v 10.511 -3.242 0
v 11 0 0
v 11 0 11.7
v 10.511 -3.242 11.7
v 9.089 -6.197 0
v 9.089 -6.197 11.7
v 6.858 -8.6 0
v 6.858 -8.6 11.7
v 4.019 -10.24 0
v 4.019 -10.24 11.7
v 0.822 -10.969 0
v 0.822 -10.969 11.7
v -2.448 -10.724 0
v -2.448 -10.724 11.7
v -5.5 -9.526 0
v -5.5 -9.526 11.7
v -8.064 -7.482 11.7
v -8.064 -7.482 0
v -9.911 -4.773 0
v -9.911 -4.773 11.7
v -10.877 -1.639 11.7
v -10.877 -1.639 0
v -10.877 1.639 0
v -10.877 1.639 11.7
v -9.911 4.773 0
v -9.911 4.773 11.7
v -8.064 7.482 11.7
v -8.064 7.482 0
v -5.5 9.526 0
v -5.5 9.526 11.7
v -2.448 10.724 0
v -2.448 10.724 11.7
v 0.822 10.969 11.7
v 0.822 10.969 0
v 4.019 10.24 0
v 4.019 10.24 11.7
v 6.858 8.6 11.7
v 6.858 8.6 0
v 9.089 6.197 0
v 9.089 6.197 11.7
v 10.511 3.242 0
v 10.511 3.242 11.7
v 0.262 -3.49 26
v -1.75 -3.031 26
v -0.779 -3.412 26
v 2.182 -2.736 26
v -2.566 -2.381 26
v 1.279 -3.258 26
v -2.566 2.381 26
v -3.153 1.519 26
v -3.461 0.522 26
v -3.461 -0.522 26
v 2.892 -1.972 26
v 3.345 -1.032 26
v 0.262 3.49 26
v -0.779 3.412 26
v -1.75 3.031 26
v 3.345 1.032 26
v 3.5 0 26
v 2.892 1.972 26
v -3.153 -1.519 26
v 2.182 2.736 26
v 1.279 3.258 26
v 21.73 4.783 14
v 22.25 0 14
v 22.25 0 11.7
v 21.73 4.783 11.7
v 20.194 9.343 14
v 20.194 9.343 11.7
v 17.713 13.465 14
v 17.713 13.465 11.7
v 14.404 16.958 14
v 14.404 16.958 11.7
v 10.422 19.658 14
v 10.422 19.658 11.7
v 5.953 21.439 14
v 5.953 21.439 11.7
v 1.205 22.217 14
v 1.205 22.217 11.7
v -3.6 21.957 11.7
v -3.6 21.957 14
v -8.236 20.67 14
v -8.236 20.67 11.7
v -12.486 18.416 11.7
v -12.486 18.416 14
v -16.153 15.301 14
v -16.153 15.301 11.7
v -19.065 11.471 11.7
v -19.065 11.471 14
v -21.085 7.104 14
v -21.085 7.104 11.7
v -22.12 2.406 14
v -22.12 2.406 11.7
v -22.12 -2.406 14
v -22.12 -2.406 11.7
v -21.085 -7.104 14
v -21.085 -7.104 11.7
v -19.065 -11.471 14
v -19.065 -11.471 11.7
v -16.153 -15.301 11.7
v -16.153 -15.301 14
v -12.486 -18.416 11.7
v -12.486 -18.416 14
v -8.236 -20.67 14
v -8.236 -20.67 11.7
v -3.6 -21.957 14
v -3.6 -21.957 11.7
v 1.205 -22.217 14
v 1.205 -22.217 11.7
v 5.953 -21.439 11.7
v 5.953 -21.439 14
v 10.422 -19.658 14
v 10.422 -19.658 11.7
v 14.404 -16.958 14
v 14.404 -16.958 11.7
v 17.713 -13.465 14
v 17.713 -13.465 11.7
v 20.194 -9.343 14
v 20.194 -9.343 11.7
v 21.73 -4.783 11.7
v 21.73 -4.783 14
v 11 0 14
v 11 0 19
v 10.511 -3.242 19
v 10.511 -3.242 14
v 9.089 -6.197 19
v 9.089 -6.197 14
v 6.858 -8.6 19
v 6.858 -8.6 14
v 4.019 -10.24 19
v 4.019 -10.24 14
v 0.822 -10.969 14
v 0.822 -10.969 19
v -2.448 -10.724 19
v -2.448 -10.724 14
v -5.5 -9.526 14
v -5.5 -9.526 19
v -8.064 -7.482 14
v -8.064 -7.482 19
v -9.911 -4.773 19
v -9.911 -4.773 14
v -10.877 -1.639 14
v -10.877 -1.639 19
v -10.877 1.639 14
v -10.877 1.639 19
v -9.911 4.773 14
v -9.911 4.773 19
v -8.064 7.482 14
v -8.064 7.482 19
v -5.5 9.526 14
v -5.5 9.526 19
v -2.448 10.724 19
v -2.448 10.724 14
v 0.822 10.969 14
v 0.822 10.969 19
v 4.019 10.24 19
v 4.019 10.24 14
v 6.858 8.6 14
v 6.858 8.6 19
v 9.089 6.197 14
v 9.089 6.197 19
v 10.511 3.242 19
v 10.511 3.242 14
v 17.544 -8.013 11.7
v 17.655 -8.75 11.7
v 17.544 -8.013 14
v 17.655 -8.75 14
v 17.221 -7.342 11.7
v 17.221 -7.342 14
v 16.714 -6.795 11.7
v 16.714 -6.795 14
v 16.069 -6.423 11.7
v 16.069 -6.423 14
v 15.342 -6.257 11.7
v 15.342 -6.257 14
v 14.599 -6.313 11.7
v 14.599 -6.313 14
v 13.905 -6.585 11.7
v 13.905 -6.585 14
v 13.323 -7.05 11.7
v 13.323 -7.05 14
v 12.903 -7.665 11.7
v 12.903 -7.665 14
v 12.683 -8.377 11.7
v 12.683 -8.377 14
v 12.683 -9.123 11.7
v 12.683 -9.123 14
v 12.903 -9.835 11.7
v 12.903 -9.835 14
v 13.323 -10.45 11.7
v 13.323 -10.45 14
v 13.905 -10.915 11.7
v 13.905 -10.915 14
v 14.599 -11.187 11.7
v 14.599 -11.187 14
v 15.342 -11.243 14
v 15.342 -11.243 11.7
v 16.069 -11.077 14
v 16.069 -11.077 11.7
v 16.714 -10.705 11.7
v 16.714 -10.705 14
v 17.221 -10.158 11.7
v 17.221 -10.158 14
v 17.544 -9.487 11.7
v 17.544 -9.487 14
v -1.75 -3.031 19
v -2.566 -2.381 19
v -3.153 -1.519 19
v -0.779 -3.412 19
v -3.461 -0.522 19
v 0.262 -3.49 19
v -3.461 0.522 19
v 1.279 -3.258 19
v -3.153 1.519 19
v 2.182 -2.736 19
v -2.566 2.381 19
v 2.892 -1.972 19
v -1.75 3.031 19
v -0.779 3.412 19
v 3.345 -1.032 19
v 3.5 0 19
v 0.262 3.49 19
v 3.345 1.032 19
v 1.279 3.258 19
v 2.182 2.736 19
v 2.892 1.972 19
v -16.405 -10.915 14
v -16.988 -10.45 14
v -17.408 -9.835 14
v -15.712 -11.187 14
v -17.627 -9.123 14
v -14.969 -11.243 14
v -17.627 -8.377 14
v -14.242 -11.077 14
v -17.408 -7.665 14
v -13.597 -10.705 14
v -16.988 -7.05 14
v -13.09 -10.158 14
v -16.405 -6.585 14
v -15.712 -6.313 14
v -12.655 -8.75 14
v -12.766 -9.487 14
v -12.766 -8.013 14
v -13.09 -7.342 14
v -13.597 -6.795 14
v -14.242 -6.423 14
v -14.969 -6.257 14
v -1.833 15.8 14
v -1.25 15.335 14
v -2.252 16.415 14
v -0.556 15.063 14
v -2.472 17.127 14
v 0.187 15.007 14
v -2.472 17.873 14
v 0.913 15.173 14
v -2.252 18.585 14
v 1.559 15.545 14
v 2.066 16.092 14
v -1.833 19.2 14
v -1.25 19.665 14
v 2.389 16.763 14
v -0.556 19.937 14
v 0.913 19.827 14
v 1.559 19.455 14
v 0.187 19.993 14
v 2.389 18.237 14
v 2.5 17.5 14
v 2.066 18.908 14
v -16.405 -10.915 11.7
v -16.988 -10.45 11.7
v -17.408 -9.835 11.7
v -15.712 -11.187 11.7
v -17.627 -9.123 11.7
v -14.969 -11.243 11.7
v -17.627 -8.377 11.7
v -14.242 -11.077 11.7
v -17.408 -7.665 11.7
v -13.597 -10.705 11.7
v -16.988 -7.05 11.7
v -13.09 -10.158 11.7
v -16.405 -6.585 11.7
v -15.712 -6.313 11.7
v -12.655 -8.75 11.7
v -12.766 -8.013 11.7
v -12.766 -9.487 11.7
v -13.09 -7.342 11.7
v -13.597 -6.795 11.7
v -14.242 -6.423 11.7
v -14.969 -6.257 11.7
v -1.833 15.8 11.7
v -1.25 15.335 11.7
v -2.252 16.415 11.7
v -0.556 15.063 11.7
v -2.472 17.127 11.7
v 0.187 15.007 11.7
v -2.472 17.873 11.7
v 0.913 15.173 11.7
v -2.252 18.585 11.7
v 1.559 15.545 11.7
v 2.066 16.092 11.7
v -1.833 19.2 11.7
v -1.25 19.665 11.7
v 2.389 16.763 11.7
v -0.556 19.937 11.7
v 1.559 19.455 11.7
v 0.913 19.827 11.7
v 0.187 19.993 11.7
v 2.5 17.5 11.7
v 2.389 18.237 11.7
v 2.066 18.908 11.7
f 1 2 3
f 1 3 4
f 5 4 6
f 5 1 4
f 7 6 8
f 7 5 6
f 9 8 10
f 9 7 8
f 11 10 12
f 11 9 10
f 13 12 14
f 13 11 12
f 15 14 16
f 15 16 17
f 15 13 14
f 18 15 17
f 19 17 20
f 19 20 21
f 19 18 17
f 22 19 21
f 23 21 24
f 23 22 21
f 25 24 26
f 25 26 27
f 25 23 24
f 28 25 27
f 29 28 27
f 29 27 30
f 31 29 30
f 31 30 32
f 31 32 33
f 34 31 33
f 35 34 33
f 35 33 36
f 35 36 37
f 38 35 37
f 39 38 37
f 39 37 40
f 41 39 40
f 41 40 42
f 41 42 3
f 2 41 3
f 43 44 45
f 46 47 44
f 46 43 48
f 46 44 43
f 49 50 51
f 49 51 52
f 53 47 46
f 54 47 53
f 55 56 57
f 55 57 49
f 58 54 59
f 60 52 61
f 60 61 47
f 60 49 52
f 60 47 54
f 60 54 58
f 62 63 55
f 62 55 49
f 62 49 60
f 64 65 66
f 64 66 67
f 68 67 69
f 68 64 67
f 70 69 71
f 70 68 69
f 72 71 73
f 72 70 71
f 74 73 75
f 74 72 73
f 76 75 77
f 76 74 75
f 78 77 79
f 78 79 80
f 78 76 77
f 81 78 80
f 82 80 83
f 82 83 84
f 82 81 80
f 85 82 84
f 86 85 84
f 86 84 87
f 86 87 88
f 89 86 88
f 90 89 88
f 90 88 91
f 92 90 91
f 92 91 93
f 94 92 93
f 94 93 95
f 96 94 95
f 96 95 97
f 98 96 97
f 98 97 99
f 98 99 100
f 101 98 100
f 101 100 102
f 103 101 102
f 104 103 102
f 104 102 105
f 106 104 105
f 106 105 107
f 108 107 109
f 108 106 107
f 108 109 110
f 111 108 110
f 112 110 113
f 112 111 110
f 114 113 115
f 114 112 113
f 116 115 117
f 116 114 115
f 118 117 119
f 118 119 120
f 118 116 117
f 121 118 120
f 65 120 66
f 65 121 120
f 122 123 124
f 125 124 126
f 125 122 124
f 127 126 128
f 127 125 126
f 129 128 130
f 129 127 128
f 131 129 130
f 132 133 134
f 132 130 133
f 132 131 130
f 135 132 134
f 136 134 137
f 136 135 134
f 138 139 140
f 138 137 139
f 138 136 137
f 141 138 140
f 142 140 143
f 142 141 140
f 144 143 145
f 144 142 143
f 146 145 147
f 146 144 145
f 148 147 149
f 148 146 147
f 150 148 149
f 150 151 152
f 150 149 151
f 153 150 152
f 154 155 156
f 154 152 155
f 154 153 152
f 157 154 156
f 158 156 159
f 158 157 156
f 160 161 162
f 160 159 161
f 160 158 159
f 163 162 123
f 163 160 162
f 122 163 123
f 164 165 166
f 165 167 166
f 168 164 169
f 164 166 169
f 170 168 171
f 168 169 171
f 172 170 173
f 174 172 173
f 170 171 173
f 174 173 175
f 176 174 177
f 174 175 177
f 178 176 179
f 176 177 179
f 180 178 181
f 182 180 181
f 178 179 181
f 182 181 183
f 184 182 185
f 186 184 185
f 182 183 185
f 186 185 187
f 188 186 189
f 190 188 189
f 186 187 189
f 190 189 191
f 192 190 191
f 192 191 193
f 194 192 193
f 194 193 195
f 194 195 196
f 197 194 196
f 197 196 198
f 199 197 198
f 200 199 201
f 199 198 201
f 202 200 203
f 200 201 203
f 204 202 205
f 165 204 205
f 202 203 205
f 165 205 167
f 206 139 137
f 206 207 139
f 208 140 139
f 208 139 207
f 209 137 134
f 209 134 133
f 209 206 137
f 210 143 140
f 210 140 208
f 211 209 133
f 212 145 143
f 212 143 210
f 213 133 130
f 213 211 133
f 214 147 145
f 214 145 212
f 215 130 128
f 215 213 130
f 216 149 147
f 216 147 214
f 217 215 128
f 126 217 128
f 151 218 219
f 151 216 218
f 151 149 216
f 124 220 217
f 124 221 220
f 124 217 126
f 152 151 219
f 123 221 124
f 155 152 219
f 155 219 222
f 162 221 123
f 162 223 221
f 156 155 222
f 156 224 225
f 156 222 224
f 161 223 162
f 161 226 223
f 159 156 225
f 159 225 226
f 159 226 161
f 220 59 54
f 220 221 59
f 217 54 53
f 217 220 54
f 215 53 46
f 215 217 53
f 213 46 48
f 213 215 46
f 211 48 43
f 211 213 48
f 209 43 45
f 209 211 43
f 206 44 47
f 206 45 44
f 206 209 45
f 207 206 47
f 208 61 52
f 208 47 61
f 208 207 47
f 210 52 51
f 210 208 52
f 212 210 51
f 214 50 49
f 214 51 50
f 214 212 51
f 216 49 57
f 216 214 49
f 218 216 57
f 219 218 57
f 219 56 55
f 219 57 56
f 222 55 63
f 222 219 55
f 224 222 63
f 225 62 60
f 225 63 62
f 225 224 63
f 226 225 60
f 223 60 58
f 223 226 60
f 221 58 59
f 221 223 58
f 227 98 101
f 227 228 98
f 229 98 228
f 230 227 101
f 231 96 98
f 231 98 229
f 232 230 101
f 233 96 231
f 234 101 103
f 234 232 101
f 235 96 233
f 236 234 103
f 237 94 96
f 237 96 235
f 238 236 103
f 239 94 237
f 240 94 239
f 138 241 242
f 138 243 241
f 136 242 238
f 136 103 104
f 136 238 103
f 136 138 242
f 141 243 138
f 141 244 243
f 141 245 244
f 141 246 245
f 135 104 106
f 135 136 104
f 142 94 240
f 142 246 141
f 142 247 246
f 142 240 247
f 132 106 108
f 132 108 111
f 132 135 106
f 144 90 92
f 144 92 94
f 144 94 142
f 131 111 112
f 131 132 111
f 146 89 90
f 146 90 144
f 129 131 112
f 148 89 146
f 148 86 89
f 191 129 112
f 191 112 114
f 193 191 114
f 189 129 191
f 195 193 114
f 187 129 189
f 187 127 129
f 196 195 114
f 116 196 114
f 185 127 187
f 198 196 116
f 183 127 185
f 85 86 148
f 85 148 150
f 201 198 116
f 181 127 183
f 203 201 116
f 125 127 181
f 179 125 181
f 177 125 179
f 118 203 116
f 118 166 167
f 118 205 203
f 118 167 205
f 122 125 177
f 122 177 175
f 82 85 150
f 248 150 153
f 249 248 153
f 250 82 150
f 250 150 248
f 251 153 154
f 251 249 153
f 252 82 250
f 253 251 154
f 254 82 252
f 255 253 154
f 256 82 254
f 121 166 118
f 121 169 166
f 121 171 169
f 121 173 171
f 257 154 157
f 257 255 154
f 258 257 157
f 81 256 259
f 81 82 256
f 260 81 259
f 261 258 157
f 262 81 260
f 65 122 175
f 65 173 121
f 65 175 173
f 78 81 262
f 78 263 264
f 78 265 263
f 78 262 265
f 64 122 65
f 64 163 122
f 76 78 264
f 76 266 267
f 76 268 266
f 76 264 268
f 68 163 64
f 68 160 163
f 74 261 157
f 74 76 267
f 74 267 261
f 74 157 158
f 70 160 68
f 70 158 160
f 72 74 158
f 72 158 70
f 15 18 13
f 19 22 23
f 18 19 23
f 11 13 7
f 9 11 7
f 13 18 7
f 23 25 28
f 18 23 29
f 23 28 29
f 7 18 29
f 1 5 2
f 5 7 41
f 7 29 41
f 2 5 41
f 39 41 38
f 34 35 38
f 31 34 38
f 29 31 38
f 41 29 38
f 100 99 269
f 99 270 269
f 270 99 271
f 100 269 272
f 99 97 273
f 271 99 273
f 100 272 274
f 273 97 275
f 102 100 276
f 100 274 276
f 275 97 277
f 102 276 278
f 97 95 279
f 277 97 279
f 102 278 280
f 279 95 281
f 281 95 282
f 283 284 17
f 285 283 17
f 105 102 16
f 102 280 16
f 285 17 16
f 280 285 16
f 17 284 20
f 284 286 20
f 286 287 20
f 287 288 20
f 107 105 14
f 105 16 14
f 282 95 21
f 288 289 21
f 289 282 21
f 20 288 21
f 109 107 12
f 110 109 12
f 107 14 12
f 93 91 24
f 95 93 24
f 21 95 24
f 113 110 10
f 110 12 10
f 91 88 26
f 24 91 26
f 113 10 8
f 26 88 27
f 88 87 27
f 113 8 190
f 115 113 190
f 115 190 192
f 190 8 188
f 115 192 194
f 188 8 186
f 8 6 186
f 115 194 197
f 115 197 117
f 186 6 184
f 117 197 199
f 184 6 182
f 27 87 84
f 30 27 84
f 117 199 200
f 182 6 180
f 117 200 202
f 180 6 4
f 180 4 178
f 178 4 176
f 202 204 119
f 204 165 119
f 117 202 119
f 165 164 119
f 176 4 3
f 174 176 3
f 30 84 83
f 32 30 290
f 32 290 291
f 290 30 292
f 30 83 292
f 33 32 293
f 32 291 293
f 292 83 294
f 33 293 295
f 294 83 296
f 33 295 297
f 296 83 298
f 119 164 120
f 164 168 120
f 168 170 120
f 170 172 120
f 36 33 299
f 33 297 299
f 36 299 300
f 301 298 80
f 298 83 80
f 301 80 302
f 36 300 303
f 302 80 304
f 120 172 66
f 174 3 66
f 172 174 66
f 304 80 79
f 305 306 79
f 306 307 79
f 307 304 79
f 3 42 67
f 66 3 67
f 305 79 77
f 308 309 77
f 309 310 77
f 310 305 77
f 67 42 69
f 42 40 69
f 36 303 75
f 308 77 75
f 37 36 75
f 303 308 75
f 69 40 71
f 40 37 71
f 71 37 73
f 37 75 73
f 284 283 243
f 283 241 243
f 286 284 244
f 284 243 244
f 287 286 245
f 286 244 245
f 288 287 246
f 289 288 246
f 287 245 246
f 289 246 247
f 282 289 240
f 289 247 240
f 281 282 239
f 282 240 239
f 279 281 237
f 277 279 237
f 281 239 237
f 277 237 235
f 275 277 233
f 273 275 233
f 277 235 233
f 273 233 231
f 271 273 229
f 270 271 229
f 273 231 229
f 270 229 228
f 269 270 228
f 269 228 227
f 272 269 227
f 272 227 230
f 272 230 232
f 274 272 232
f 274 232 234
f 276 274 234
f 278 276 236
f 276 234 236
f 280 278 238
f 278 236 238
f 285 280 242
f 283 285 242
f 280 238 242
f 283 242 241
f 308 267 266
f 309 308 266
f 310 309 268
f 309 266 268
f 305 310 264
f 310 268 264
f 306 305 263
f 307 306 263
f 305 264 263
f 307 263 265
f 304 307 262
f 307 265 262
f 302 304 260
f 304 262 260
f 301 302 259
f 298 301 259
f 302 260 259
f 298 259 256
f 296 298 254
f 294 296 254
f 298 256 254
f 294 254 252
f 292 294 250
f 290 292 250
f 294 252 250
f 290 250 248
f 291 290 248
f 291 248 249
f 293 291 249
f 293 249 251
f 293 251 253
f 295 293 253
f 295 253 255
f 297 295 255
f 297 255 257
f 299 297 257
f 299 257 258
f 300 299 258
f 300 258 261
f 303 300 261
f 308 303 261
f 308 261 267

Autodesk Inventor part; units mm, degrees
ref_plane "YZ Plane" through (0, 0, 0) normal (1, 0, 0) x (0, 1, 0)
ref_plane "XZ Plane" through (0, 0, 0) normal (0, 1, 0) x (-1, 0, 0)
sketch "Sketch1" plane through (0, 0, 0) normal (0, 0, 1) x (1, 0, 0)
  circle A0 centre (0, 0) radius 11
  dimension "d0" = 22
extrude "Extrusion1" add sketch "Sketch1" along normal blind 19
ref_plane "Work Plane1" through (0, 0, 14) normal (0, 0, 1) x (1, 0, 0)
sketch "Sketch2" plane through (0, 0, 14) normal (0, 0, 1) x (1, 0, 0)
  circle A0 centre (0, 0) radius 22.25
  circle A1 centre (0, 17.5) radius 2.5
  circle A2 centre (-15.1554, -8.75) radius 2.5
  circle A3 centre (15.1554, -8.75) radius 2.5
  dimension "d4" = 44.5
  dimension "d5" = 5
  dimension "d6" = 17.5
  dimension "d9" = 360
extrude "Extrusion2" add sketch "Sketch2" against normal blind 2.3
sketch "Sketch3" plane through (0, 0, 19) normal (0, 0, 1) x (1, 0, 0)
  circle A0 centre (0, 0) radius 3.5
  dimension "d13" = 7
extrude "Extrusion3" add sketch "Sketch3" along normal blind 7
properties part number "Slip Ring" material "ABS Plastic"
